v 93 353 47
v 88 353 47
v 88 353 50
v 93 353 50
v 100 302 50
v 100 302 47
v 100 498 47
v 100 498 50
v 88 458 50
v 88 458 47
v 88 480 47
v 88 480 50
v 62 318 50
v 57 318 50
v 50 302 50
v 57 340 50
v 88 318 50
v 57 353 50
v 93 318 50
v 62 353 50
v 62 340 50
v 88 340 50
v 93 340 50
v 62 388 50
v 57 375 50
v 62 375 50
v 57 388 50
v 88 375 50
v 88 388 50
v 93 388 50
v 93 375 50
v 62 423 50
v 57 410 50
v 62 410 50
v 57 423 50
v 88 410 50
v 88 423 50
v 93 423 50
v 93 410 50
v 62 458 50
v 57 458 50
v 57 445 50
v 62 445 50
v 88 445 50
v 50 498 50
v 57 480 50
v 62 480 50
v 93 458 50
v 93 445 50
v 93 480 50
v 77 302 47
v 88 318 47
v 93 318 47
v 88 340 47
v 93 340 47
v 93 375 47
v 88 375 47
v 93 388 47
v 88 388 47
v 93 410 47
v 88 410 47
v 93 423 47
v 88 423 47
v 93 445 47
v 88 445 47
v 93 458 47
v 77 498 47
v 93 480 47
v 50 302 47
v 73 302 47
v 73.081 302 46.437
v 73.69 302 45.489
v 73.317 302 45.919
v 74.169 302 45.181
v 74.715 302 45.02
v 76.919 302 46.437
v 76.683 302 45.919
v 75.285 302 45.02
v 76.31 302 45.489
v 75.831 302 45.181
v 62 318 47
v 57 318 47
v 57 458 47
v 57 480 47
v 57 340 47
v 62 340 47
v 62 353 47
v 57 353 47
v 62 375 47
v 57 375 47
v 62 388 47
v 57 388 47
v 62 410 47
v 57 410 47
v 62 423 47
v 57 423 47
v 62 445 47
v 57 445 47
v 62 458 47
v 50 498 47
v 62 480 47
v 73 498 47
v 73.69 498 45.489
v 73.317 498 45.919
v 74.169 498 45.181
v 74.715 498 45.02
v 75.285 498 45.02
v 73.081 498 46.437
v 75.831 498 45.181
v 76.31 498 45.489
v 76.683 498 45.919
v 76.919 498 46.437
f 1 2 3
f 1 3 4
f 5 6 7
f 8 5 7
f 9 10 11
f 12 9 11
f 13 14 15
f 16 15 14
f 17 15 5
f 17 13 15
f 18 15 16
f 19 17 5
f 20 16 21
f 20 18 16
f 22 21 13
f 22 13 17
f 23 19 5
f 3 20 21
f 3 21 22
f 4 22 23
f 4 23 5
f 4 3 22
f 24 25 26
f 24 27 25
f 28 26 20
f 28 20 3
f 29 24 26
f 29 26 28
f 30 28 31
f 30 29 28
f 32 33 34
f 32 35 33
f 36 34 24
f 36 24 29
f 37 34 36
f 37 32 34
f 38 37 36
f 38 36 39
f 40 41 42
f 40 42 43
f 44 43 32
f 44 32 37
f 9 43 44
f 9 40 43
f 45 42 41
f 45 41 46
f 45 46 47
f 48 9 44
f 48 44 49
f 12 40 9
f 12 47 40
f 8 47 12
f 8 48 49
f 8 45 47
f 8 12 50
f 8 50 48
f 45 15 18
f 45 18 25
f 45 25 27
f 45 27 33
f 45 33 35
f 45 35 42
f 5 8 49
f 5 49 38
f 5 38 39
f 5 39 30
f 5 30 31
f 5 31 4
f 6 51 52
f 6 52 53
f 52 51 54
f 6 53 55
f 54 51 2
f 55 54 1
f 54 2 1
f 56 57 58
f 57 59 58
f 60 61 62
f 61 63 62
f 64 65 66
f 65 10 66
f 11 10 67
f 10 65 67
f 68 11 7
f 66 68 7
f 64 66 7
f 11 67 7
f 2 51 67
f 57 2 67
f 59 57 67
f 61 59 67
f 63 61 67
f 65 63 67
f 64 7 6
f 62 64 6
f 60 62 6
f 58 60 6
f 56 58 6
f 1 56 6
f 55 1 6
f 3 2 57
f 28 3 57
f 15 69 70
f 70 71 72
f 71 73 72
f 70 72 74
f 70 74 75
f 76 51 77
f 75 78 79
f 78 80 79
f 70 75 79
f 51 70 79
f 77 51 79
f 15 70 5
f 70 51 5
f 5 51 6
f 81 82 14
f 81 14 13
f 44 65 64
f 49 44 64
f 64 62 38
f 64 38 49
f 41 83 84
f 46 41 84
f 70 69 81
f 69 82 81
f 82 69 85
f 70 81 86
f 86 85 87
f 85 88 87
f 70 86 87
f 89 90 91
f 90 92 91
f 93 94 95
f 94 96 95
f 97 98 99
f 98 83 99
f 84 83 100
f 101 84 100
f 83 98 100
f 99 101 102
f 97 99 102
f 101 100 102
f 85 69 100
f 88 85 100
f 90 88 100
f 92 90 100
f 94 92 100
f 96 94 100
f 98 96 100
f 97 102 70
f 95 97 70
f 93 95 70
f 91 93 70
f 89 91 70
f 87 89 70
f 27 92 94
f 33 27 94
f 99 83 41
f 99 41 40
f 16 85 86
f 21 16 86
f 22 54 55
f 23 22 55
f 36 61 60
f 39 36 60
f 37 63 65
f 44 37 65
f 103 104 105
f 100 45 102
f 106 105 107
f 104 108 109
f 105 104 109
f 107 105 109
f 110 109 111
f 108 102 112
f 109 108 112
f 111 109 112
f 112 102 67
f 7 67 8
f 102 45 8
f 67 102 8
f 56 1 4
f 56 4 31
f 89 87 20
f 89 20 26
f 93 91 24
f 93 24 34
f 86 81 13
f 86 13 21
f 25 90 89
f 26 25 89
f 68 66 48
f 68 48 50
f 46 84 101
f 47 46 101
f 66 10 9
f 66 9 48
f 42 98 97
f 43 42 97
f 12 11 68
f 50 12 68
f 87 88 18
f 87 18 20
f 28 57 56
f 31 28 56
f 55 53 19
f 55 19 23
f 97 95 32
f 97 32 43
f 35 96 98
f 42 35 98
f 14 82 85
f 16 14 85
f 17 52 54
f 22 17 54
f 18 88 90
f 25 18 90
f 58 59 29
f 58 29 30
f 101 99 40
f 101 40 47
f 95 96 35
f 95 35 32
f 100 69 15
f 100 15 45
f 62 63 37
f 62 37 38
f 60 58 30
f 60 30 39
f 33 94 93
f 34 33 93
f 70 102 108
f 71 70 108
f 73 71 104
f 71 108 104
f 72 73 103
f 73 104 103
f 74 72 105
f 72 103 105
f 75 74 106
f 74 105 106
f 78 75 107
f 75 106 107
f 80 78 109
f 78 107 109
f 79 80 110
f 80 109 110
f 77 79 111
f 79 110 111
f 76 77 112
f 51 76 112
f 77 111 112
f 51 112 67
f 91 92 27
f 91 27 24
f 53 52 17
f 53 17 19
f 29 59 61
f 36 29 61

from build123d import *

# Parameters (mm, degrees)
BOX033_W          = 5
BOX033_H          = 22
BOX033_DEPTH      = 5
ARRAY004_Y_COUNT  = 5
ARRAY004_Y_PITCH  = 35
BOX032_W          = 5
BOX032_H          = 22
BOX032_DEPTH      = 5
ARRAY003_Y_COUNT  = 5
ARRAY003_Y_PITCH  = 35
CYLINDER012_R     = 2
CYLINDER012_DEPTH = 196
BOX031_W          = 50
BOX031_H          = 196
BOX031_DEPTH      = 3


with BuildPart() as array004:
    # Box033 → Box033 (new body)
    with BuildSketch(Plane.XY):
        with Locations((2.5, 11)):
            Rectangle(BOX033_W, BOX033_H)
    extrude(amount=BOX033_DEPTH)

    # Array004 Y: Array004 ×5


with BuildPart() as array004_1:
    add(array004.part)
    with Locations(*[(0, i * ARRAY004_Y_PITCH, 0) for i in range(1, ARRAY004_Y_COUNT)]):
        add(array004.part)


with BuildPart() as array004_2:
    # Array004 placement: moved
    add(array004_1.part.moved(Location((88, 318, 47))))


with BuildPart() as array003:
    # Box032 → Box032 (new body)
    with BuildSketch(Plane.XY):
        with Locations((2.5, 11)):
            Rectangle(BOX032_W, BOX032_H)
    extrude(amount=BOX032_DEPTH)

    # Array003 Y: Array003 ×5


with BuildPart() as array003_1:
    add(array003.part)
    with Locations(*[(0, i * ARRAY003_Y_PITCH, 0) for i in range(1, ARRAY003_Y_COUNT)]):
        add(array003.part)


with BuildPart() as array003_2:
    # Array003 placement: moved
    add(array003_1.part.moved(Location((57, 318, 47))))


with BuildPart() as soporte_electronica_refuerzo:
    # Cylinder012 → Cylinder012 (new body)
    with BuildSketch(Plane(origin=(75, 498, 47), x_dir=(1, 0, 0), z_dir=(0, -1, 0))):
        Circle(CYLINDER012_R)
    extrude(amount=CYLINDER012_DEPTH)


with BuildPart() as soporte_electronica_con_agujeros:
    # Box031 → Box031 (new body)
    with BuildSketch(Plane(origin=(50, 302, 47), x_dir=(1, 0, 0), z_dir=(0, 0, 1))):
        with Locations((25, 98)):
            Rectangle(BOX031_W, BOX031_H)
    extrude(amount=BOX031_DEPTH)

    # Fusion012: union soporte-electronica-refuerzo
    add(soporte_electronica_refuerzo.part)

    # Cut021005: cut Array003
    add(array003_2.part, mode=Mode.SUBTRACT)

    # Cut021006: cut Array004
    add(array004_2.part, mode=Mode.SUBTRACT)


solid = soporte_electronica_con_agujeros.part
